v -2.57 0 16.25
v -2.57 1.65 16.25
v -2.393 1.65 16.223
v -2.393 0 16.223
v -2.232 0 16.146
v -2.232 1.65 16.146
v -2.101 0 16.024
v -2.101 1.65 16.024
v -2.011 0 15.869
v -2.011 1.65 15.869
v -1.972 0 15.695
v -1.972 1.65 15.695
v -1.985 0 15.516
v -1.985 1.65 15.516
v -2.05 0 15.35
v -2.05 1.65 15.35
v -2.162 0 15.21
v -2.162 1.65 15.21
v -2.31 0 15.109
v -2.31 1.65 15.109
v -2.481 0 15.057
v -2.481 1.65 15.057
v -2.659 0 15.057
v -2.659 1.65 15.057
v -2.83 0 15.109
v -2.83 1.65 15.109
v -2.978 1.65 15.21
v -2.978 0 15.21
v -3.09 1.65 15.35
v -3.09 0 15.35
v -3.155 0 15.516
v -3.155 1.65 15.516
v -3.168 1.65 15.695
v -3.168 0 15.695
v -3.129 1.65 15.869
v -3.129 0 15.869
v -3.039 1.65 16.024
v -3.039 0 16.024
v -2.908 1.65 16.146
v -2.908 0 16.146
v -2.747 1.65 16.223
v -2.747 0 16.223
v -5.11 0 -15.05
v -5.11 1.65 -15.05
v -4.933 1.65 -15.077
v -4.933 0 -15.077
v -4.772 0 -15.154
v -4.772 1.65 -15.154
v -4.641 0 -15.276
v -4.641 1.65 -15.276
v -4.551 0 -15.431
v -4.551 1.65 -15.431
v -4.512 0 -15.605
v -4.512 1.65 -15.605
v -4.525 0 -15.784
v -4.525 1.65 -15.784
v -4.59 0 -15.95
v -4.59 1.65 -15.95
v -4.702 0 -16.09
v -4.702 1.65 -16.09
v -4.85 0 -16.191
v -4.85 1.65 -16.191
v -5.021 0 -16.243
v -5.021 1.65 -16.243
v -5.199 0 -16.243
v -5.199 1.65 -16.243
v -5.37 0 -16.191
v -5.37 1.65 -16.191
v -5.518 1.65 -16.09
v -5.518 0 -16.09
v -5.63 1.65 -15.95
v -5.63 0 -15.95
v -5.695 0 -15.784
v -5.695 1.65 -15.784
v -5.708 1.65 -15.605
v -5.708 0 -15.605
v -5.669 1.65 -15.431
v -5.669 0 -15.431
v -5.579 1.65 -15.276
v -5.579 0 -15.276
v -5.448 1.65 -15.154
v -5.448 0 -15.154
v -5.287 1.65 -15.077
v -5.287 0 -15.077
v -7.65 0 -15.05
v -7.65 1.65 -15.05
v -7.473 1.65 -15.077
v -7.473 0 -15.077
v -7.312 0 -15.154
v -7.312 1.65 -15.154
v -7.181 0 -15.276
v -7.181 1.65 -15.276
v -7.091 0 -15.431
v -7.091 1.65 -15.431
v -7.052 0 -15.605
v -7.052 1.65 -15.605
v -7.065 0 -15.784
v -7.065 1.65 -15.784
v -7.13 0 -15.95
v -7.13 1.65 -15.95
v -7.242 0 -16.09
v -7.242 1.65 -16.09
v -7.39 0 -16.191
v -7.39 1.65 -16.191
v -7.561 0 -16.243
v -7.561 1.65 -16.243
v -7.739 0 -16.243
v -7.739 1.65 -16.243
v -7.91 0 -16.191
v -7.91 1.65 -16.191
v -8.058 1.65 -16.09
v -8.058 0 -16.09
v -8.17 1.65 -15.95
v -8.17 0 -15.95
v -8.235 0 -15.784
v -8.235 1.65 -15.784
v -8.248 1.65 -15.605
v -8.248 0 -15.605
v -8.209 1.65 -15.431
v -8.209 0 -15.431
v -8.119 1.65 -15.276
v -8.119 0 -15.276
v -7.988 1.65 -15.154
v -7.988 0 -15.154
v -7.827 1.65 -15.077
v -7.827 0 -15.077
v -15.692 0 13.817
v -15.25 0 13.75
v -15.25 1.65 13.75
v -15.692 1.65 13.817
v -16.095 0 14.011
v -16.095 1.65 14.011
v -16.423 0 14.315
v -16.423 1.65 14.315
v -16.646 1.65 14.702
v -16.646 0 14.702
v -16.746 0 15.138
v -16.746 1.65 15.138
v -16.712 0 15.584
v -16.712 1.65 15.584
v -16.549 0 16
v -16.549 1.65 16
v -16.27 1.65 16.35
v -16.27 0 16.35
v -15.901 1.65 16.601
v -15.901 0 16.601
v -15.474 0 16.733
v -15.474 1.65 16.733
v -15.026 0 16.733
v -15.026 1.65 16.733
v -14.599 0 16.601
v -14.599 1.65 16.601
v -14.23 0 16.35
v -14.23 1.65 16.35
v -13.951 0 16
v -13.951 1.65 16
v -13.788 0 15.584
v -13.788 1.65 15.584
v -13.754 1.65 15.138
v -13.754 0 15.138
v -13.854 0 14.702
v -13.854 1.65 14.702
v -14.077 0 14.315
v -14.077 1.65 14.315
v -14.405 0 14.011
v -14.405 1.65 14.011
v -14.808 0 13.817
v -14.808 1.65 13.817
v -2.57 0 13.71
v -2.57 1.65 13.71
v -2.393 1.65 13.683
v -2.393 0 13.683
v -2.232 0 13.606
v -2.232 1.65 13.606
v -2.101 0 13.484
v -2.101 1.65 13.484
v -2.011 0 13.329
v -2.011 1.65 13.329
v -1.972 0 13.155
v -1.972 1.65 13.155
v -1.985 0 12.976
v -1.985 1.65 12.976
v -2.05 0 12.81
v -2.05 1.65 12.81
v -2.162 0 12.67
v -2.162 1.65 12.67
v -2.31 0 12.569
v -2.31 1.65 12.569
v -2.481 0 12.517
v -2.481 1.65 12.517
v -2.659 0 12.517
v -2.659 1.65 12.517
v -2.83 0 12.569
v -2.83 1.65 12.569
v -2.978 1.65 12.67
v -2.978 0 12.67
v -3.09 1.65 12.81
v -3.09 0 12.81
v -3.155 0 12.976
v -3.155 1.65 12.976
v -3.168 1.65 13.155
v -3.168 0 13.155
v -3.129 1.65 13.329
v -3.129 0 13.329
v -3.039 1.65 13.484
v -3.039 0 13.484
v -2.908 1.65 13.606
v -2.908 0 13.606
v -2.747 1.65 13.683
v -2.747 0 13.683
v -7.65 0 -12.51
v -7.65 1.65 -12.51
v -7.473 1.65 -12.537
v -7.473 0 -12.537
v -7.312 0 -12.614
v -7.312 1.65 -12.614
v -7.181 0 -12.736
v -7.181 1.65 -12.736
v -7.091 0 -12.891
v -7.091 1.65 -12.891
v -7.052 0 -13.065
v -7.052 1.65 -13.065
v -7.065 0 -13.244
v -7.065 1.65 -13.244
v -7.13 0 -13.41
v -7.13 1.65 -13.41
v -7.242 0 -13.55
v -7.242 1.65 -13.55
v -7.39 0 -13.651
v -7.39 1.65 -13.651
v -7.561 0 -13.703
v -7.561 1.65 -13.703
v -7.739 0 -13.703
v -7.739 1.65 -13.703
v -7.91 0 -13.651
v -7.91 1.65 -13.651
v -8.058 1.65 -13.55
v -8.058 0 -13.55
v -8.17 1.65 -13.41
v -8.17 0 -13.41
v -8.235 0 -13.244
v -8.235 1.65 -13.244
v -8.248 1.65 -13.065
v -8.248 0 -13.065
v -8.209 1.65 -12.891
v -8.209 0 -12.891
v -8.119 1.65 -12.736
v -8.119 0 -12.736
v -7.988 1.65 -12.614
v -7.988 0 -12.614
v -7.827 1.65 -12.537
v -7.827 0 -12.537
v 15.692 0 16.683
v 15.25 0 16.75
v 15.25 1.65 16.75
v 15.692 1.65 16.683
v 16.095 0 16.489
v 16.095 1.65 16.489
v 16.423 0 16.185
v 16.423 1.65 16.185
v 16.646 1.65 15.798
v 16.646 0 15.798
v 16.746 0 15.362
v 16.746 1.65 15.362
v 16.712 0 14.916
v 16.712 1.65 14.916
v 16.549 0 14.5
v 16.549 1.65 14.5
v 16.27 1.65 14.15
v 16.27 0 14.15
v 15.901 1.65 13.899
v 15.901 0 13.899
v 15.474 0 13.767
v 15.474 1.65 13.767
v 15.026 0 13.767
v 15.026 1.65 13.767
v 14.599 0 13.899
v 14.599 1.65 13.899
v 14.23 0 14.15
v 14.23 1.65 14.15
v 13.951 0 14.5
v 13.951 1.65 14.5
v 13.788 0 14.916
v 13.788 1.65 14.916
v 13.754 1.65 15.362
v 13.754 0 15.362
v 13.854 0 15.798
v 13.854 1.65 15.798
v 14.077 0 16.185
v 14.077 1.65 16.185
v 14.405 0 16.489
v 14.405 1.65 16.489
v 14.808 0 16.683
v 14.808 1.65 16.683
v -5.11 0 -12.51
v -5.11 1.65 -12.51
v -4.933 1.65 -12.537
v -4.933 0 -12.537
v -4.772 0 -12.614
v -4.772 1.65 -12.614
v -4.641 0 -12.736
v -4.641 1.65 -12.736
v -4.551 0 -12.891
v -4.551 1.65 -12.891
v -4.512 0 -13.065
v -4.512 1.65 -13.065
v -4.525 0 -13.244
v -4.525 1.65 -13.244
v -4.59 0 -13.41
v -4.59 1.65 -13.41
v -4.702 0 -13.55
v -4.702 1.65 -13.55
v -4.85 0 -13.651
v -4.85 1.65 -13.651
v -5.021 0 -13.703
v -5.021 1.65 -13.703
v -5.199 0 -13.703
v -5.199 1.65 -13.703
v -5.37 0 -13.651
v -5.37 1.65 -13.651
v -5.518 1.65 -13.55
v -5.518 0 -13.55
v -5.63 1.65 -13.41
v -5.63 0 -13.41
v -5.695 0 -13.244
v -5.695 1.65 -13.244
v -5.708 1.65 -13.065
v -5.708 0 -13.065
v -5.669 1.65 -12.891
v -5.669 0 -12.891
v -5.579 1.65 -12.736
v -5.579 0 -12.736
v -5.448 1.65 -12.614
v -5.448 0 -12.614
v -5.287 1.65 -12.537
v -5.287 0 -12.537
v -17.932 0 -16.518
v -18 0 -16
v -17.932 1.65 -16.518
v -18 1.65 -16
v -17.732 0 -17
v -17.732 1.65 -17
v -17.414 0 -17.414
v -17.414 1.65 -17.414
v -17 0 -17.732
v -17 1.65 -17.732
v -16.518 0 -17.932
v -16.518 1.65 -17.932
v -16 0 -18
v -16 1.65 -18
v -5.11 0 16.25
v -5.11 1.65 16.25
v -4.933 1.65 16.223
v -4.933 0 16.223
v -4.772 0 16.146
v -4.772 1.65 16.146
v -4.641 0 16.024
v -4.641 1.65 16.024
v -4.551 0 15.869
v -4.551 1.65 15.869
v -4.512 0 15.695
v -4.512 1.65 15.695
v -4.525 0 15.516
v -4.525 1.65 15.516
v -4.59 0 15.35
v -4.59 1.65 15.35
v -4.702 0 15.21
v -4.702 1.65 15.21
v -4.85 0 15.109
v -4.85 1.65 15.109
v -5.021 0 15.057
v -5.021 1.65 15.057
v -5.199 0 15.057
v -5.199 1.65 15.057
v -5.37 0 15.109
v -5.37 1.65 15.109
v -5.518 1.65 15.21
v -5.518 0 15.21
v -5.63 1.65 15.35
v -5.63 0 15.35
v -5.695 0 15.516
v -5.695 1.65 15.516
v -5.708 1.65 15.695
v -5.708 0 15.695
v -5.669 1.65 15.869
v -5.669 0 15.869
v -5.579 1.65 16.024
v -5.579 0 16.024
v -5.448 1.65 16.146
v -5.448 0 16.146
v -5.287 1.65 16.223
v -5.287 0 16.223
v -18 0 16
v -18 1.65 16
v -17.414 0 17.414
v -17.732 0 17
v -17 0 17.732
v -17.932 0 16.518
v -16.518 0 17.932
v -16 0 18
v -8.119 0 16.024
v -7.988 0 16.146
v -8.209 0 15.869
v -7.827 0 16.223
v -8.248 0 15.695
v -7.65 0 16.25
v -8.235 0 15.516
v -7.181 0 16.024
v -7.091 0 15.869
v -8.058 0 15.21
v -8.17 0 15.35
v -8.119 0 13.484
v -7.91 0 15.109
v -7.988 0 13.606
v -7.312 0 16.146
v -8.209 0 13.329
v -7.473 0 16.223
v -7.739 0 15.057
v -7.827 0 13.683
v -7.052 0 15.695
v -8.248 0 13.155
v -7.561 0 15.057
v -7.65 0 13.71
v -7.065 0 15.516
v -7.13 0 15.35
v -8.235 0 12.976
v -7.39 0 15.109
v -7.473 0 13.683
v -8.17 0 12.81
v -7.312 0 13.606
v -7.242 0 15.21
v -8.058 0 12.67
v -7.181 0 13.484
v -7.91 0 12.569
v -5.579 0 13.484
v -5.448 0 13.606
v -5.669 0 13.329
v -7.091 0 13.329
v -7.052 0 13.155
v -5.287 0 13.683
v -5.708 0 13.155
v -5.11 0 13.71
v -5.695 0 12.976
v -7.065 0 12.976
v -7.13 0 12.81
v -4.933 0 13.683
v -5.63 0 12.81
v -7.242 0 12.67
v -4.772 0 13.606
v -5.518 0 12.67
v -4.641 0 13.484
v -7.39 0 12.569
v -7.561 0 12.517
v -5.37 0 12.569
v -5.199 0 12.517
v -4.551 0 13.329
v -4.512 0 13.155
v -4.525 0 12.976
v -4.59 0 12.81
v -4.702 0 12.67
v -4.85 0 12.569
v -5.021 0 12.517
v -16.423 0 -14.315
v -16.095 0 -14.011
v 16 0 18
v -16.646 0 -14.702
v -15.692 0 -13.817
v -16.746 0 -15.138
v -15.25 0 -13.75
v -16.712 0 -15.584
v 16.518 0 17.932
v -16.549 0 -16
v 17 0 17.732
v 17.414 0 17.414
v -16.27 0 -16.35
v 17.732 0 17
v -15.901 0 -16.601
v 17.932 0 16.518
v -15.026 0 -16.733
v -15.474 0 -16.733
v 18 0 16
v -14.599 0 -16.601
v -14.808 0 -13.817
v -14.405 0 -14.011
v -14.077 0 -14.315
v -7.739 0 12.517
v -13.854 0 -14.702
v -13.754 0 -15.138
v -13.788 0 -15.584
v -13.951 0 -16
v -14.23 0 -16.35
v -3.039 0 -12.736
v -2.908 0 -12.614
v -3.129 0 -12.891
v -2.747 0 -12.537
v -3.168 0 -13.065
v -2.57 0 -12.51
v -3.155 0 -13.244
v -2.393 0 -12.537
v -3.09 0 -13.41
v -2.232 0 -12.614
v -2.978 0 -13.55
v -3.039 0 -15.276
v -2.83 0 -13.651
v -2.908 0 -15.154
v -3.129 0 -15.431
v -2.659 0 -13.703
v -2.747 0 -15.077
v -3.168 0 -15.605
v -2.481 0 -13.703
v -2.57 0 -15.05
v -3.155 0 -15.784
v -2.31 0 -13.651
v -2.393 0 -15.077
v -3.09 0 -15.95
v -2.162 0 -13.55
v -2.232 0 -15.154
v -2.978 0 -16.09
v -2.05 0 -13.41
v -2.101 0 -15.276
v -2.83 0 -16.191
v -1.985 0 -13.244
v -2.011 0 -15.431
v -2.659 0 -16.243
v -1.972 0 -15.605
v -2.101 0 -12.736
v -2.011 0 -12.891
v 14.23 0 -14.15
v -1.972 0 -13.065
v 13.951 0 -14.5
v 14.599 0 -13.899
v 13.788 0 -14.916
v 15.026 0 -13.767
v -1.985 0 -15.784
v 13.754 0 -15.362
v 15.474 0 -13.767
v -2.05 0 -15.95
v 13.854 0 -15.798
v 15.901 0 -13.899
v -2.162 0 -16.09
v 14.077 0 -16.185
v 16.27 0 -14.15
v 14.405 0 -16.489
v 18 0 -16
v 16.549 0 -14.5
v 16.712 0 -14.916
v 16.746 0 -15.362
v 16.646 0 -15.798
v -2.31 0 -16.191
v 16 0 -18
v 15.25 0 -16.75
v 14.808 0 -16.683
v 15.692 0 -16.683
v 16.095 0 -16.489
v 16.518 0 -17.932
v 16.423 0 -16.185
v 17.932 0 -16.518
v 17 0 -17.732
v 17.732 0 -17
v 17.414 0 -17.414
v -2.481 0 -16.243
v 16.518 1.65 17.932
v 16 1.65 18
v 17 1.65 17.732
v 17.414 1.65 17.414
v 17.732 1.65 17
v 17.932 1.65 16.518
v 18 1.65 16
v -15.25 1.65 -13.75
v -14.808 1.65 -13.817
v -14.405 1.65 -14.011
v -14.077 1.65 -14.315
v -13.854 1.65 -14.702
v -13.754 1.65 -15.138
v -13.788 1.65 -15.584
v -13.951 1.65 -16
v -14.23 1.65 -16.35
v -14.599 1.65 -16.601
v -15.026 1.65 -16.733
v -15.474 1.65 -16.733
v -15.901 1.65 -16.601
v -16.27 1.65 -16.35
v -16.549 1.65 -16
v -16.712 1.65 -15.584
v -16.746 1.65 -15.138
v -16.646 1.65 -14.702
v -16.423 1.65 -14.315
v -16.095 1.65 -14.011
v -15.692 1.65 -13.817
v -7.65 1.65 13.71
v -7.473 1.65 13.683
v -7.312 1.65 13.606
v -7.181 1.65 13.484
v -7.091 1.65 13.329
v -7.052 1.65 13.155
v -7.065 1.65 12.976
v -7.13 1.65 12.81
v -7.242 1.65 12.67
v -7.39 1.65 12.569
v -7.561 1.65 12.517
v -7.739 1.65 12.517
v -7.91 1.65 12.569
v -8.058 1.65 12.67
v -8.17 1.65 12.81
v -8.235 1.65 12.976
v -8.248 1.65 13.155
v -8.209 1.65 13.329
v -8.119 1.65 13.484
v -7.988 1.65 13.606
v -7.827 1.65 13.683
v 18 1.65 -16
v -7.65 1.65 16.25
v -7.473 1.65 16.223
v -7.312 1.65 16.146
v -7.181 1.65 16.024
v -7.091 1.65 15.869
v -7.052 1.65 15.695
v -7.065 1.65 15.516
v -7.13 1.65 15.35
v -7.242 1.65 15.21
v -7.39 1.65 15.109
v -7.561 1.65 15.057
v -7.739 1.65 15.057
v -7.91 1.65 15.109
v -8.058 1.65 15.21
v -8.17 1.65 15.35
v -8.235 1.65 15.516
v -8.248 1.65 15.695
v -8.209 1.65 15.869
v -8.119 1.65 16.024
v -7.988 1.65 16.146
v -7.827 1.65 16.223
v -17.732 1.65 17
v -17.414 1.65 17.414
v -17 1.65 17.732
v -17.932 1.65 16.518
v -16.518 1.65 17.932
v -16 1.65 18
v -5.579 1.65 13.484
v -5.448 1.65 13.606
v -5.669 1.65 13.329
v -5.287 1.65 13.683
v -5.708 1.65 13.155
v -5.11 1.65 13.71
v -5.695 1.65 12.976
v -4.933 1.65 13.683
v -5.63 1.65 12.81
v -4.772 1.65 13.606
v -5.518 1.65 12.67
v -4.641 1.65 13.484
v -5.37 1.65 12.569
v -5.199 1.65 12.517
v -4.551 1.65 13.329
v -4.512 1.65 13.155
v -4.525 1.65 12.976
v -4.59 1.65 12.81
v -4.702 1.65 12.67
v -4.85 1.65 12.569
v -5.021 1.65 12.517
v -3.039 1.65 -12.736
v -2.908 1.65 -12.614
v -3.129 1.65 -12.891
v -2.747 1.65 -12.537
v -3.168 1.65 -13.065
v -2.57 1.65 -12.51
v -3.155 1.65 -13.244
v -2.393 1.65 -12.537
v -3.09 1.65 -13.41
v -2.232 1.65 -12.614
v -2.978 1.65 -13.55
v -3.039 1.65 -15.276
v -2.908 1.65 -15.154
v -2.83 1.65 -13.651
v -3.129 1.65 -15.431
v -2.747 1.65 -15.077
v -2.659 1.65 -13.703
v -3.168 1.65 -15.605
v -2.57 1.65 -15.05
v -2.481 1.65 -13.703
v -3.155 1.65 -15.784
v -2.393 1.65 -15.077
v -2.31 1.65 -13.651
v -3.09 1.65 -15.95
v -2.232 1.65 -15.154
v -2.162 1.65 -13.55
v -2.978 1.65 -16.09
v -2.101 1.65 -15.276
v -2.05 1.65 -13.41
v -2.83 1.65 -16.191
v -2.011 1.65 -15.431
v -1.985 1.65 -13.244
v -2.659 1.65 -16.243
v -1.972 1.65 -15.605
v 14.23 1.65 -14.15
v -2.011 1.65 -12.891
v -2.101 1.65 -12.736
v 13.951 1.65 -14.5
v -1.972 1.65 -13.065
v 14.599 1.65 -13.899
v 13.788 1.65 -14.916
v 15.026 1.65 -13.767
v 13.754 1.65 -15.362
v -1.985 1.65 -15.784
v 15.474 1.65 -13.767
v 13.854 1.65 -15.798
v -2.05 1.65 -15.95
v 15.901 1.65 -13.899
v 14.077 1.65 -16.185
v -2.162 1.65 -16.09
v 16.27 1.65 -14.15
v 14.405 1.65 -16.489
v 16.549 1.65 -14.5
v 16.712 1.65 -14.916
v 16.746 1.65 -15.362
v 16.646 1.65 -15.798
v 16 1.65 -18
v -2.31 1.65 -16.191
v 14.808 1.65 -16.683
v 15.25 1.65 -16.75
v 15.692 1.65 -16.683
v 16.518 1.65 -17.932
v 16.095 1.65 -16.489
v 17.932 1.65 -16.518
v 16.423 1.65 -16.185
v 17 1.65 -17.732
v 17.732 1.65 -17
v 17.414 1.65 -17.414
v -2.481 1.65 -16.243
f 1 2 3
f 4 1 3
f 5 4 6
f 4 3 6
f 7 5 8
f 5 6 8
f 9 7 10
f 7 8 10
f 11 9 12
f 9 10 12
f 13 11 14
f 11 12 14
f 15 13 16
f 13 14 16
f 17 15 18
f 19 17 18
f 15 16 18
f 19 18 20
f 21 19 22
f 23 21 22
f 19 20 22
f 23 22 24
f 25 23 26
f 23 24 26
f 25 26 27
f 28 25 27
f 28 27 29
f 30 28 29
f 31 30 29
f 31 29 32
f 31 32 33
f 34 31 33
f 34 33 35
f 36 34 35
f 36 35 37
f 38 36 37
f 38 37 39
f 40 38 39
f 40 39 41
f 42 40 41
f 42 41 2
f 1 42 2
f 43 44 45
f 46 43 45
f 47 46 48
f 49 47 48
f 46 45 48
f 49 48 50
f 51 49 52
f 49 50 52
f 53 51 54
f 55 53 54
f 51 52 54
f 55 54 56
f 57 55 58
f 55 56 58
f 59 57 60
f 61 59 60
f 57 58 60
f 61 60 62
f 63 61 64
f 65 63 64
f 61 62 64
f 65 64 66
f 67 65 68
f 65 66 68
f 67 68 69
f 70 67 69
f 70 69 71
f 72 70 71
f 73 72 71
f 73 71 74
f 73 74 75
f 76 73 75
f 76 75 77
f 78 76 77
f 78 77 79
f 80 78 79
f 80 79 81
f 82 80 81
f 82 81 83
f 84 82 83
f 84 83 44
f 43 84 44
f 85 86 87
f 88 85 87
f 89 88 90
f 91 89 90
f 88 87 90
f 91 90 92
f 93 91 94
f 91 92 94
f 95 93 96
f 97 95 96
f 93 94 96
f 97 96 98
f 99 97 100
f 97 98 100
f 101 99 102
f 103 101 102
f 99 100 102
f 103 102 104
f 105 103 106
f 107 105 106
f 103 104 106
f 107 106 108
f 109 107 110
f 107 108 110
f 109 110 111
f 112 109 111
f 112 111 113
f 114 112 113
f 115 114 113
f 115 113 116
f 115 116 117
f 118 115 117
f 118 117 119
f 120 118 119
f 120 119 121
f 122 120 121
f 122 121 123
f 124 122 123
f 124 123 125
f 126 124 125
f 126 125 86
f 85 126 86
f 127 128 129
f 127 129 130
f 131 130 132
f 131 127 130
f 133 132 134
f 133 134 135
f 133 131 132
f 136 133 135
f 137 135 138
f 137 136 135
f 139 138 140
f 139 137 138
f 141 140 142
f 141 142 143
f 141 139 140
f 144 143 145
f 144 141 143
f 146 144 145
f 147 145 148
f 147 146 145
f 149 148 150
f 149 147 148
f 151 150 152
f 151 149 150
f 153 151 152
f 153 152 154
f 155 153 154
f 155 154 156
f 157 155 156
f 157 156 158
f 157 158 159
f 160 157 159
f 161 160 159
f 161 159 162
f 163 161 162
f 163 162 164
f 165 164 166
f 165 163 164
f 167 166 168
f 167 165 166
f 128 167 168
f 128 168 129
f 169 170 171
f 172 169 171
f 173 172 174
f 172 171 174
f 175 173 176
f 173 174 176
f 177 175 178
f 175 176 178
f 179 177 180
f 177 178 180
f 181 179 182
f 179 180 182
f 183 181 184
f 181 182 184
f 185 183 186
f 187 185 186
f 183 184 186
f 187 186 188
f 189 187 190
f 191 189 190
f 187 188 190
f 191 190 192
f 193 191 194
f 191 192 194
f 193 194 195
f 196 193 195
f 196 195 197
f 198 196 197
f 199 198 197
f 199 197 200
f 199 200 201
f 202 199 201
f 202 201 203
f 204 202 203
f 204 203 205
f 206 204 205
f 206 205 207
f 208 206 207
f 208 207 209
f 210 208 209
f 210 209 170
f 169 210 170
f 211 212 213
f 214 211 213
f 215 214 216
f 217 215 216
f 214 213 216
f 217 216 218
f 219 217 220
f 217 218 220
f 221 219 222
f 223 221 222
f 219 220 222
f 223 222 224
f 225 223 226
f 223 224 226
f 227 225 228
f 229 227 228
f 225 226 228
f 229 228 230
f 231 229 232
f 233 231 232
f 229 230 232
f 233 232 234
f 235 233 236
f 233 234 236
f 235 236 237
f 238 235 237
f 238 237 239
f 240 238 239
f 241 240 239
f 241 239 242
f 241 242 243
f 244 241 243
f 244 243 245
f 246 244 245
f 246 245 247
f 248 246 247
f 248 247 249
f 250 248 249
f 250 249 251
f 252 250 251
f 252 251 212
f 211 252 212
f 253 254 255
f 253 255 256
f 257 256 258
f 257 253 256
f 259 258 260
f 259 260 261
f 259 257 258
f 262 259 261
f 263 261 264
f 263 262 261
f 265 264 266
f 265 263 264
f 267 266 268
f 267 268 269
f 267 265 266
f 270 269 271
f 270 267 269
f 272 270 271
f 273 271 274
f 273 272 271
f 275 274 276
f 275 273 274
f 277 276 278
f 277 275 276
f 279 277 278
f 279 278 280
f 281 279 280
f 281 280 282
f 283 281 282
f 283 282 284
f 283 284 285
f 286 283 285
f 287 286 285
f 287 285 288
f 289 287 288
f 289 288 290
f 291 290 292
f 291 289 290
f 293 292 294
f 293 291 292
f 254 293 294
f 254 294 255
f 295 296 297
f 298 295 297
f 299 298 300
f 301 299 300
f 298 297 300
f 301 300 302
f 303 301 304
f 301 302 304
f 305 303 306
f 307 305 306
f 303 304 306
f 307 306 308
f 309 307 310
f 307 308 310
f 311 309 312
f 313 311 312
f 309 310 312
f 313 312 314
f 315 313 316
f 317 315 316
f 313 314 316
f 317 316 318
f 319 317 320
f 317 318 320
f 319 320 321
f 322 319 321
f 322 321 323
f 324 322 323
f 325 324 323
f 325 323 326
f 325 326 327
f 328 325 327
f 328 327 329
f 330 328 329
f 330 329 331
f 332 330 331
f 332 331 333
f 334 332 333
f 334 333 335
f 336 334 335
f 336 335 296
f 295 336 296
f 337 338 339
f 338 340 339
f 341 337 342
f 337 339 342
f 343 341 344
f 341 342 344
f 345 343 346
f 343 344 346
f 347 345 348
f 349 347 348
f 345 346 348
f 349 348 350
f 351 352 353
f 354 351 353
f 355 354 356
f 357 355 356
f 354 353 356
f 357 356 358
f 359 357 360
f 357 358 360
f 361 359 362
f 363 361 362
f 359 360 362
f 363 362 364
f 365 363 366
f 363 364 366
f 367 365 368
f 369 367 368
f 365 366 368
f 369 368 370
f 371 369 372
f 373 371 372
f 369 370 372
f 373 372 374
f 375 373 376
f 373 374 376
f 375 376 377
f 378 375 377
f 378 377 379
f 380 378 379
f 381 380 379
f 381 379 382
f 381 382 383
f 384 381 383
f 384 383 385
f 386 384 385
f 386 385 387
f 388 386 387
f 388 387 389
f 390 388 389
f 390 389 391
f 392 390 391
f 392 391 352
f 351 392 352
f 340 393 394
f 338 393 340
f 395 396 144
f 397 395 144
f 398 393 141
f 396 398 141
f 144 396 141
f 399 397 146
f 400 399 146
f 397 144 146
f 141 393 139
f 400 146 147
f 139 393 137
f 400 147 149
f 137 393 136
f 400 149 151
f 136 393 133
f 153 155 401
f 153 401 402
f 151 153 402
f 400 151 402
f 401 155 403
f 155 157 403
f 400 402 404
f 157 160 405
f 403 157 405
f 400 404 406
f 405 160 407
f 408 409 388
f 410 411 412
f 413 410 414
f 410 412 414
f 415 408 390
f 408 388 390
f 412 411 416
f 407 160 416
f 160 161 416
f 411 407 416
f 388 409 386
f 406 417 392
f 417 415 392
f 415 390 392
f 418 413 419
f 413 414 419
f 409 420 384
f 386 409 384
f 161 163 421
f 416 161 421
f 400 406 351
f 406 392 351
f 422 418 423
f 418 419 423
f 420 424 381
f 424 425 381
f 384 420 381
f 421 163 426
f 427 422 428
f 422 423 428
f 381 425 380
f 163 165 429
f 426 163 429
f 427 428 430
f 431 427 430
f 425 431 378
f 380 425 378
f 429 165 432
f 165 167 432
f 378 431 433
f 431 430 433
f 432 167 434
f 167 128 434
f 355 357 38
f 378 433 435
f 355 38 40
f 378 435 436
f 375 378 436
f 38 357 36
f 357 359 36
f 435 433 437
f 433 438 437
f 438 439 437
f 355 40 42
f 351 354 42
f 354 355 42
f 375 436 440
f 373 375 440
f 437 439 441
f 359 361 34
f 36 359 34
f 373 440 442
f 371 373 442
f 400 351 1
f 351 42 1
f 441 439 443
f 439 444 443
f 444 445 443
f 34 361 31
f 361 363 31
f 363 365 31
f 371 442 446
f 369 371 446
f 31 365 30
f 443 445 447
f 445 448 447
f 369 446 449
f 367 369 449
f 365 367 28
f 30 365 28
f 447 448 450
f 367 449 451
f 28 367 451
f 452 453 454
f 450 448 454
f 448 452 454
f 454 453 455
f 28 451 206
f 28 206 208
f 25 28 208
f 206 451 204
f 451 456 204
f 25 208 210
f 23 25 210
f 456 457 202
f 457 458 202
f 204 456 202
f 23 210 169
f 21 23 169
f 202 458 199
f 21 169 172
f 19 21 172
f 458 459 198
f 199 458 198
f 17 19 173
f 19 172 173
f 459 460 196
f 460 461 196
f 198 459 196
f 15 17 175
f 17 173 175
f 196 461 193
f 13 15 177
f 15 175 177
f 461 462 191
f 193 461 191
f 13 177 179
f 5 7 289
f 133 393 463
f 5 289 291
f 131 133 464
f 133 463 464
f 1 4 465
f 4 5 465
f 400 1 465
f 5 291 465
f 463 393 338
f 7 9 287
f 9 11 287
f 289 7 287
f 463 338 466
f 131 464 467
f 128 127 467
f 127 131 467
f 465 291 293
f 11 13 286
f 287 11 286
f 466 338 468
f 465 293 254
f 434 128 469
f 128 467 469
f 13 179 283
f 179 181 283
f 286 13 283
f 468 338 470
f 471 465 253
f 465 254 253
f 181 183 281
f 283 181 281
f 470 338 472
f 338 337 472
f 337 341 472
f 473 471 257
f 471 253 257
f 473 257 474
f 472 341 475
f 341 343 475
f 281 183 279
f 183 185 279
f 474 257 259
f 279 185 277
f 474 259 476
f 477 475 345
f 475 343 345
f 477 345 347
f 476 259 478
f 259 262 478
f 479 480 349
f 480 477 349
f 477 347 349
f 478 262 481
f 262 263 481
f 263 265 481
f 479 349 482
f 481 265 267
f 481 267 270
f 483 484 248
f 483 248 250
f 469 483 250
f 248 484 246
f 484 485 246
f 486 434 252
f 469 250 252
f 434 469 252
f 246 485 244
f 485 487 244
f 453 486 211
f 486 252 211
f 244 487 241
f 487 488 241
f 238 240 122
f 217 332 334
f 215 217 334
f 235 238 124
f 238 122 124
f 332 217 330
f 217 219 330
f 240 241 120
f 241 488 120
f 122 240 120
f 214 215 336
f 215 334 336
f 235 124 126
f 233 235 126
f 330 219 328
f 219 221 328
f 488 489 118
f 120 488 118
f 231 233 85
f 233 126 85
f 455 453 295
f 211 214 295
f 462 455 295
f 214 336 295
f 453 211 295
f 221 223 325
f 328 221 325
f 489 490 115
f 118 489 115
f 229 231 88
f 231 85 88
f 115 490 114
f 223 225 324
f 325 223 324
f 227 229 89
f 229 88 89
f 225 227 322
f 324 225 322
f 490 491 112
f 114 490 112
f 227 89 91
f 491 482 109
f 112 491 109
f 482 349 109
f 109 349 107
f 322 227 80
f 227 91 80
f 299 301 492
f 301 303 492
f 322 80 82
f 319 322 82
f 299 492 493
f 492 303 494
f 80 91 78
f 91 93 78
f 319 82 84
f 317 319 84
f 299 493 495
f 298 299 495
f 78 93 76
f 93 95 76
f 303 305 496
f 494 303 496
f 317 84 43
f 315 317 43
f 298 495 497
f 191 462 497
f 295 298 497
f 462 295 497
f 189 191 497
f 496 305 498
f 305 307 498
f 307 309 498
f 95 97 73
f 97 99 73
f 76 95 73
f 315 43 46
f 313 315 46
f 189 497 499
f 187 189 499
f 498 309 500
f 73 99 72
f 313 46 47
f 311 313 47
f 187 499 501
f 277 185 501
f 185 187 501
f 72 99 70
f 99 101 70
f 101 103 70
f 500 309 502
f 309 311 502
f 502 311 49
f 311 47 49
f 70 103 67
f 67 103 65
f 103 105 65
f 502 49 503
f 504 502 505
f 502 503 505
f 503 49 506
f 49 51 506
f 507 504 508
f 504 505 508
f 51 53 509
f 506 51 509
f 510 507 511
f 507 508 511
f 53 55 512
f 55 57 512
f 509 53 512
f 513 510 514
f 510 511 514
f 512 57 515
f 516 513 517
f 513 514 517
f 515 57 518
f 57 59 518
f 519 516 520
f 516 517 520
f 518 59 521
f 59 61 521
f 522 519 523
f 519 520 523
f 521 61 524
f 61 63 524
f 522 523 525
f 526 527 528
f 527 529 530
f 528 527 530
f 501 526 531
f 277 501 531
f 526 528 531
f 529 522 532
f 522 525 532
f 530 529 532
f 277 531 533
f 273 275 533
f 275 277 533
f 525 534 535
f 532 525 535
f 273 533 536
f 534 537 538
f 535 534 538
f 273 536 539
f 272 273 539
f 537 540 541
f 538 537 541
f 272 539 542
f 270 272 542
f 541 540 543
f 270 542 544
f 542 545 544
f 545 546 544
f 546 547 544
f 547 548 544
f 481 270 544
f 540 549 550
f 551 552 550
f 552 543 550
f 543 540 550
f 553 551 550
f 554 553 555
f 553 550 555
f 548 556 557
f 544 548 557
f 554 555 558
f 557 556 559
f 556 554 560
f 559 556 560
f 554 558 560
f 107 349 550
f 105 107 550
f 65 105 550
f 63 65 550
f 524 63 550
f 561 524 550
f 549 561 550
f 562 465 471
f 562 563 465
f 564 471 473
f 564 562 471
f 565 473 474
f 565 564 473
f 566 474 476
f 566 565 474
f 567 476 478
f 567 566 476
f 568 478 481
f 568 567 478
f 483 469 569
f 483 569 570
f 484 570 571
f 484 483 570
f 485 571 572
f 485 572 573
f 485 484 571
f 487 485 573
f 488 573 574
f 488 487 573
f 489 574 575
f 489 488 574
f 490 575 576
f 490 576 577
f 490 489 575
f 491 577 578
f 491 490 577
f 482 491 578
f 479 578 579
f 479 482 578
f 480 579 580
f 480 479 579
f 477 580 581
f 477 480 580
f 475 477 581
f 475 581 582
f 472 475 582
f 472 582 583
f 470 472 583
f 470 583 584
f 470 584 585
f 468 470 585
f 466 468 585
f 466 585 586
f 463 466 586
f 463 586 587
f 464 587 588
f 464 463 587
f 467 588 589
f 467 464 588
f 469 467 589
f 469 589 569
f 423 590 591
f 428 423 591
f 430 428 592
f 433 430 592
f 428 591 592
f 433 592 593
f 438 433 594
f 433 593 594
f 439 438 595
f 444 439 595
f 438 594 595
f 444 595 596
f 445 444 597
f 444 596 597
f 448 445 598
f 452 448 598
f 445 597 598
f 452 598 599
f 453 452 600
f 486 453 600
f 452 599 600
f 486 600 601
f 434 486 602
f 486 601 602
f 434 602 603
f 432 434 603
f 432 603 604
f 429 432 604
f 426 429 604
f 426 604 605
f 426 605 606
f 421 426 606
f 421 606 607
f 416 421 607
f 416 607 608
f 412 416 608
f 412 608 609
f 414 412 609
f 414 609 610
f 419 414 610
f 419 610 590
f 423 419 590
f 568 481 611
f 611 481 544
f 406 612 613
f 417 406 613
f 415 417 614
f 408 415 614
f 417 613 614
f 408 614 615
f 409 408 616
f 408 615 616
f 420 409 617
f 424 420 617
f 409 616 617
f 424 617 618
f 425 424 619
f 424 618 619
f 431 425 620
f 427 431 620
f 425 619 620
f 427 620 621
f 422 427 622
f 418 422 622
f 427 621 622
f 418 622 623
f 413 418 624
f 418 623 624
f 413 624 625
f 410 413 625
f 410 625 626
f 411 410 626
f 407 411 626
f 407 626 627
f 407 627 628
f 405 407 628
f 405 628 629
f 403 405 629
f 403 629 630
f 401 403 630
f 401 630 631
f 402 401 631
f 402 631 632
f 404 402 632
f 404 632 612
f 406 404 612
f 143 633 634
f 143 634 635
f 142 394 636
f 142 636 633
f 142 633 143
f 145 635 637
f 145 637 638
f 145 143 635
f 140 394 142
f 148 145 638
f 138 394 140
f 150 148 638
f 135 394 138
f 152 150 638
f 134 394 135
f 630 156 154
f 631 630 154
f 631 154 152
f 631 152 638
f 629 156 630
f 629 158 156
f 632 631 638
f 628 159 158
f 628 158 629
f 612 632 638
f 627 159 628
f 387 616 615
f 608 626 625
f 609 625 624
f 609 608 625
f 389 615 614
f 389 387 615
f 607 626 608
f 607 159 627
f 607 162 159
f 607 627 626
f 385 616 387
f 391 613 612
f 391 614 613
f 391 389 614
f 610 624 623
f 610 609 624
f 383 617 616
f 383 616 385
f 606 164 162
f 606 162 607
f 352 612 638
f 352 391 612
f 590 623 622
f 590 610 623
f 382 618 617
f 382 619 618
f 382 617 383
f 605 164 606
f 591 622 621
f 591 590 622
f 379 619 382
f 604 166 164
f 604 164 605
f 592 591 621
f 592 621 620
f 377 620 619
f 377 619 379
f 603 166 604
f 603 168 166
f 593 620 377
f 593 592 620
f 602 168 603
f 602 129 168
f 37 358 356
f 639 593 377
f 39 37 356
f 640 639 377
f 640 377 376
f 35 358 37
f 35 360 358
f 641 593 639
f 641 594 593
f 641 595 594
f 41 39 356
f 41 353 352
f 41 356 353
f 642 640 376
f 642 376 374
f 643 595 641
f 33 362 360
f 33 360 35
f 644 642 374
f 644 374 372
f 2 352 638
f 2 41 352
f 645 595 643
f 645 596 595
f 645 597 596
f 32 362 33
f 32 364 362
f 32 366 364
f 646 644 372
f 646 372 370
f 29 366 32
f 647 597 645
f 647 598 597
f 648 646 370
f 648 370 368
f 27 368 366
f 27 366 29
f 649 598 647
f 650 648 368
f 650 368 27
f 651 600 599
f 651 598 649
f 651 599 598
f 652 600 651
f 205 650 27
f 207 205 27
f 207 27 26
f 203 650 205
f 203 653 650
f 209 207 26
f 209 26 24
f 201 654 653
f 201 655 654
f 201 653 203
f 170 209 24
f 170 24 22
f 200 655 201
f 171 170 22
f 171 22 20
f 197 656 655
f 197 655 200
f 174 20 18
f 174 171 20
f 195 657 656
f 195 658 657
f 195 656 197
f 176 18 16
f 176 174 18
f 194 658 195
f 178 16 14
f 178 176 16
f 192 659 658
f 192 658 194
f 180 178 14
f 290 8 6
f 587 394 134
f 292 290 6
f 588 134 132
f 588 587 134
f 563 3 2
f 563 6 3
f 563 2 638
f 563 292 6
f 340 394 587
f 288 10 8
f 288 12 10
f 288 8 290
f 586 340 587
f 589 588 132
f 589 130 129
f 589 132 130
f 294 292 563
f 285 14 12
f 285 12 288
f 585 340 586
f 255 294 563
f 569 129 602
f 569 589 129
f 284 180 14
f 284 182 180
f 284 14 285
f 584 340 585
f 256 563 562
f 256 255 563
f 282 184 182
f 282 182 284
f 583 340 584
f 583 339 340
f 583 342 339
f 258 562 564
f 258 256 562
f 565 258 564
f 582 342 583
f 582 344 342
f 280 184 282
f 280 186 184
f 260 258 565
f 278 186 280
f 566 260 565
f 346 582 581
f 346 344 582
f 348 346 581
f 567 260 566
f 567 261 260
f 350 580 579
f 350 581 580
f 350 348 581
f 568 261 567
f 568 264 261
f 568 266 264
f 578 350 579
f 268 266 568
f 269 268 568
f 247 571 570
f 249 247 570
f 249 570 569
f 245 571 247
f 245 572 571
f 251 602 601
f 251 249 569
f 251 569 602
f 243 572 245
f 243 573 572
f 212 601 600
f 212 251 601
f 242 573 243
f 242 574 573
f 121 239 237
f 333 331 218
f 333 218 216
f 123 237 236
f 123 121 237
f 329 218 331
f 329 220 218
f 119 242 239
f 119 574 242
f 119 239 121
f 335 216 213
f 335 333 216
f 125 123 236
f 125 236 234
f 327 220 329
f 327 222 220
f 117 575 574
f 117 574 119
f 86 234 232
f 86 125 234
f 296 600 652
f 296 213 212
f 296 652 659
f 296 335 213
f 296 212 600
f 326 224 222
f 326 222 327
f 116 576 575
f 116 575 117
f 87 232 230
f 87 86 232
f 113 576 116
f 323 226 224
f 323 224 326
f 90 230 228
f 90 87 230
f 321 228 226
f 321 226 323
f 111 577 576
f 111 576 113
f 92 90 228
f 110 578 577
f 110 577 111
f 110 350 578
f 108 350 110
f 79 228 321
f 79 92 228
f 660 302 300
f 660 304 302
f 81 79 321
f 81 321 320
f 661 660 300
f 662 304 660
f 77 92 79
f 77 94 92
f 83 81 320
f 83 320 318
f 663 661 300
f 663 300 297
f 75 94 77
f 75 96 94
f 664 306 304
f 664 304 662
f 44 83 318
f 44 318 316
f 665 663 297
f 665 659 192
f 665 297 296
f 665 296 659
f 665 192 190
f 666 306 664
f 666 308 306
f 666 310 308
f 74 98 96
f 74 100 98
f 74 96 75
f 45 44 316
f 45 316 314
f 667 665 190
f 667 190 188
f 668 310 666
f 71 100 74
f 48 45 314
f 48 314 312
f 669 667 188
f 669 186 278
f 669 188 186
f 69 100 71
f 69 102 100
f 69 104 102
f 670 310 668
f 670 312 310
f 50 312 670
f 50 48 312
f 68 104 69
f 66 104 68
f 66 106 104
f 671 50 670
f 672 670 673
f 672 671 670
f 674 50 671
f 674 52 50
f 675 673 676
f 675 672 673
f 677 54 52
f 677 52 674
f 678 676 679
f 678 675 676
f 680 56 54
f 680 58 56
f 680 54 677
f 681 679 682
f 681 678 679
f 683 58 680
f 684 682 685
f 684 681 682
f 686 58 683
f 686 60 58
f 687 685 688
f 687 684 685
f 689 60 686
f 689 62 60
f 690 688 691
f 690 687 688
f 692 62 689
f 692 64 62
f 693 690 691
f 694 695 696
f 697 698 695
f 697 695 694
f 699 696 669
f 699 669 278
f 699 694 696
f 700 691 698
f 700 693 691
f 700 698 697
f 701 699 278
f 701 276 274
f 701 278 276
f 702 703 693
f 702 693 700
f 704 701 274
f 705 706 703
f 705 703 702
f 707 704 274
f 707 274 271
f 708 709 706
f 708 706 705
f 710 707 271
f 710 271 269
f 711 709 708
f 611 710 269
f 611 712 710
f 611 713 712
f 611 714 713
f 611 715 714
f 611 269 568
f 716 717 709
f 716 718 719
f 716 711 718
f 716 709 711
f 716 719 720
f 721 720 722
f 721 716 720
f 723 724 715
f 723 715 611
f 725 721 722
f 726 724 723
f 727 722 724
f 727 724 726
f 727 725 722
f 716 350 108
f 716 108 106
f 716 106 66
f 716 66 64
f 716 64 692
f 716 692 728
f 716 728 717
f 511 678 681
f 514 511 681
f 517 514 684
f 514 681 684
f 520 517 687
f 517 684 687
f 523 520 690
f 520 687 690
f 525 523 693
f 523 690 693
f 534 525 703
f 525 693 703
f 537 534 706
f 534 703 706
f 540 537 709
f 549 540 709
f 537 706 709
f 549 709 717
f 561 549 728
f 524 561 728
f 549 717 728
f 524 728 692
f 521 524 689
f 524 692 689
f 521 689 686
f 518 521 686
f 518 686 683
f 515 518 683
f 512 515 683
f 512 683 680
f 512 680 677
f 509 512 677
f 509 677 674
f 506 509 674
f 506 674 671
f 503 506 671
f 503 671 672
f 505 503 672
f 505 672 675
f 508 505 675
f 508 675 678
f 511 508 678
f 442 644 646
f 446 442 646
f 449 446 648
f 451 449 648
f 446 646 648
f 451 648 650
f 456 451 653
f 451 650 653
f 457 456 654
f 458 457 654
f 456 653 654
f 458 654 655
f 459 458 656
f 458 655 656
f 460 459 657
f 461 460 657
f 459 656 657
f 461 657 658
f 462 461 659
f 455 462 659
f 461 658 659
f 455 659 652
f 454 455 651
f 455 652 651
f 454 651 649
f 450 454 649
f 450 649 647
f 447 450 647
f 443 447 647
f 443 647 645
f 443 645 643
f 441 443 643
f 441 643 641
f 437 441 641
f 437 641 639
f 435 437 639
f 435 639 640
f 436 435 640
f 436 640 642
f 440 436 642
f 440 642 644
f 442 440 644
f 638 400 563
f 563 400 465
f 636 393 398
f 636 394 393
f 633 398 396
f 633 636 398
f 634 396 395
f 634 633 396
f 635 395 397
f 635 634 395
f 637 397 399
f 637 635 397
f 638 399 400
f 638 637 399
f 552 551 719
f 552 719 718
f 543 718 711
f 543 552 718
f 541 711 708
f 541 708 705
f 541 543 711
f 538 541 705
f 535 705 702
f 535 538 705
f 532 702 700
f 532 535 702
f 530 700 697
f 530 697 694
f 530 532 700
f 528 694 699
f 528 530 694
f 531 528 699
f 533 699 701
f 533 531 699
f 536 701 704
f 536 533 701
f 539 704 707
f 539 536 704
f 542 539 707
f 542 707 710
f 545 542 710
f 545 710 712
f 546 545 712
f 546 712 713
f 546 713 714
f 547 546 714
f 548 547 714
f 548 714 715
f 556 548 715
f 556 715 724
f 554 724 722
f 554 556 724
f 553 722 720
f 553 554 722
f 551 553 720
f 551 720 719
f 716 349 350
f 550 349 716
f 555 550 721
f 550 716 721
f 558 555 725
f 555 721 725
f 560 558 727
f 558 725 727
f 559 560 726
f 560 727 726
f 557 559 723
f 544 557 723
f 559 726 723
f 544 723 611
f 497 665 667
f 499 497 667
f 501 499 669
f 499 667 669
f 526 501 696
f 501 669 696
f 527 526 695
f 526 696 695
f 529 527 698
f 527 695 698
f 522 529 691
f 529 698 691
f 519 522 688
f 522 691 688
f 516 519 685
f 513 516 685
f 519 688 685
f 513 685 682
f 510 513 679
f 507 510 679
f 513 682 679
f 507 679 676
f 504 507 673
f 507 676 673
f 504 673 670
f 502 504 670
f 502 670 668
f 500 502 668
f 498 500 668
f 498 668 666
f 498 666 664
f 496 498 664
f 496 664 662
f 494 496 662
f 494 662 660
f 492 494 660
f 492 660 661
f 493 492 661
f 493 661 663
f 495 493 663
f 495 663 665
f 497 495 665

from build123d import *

# Parameters (mm, degrees)
SKETCH1_W             = 36
SKETCH1_H             = 36
SKETCH1_R             = 1.5
BASE_SHAPE_DEPTH      = 1.65
ROUNDED_CORNERS_R     = 2
PINHEADER_HOLES_REACH = 27.509
SKETCH2_R             = 0.6


with BuildPart() as part:
    # Sketch1 → Base shape (new body)
    with BuildSketch(Plane(origin=(0, 0, 0), x_dir=(1, 0, 0), z_dir=(0, 1, 0))):
        Rectangle(SKETCH1_W, SKETCH1_H)
        with Locations(Location((-15.25, 15.25, 0), (0, 0, 270))):
            Circle(SKETCH1_R, mode=Mode.SUBTRACT)
        with Locations(Location((15.25, 15.25, 0), (0, 0, 90))):
            Circle(SKETCH1_R, mode=Mode.SUBTRACT)
        with Locations(Location((15.25, -15.25, 0), (0, 0, 270))):
            Circle(SKETCH1_R, mode=Mode.SUBTRACT)
        with Locations(Location((-15.25, -15.25, 0), (0, 0, 90))):
            Circle(SKETCH1_R, mode=Mode.SUBTRACT)
    extrude(amount=BASE_SHAPE_DEPTH)

    # Rounded corners
    rounded_corners_edges = [part.edges().sort_by_distance(p)[0] for p in [
        (18, 0.825, 18),
        (-18, 0.825, 18),
        (-18, 0.825, -18),
        (18, 0.825, -18),
    ]]
    fillet(rounded_corners_edges, radius=ROUNDED_CORNERS_R)

    # Sketch2 → Pinheader holes (cut, up to next)
    with BuildSketch(Plane(origin=(0, 1.65, 0), x_dir=(1, 0, 0), z_dir=(0, 1, 0)), mode=Mode.PRIVATE) as pinheader_holes_sk1:
        with Locations(Location((-5.11, 15.65, 0), (0, 0, 270))):
            Circle(SKETCH2_R)
    pinheader_holes_tool1 = extrude(pinheader_holes_sk1.sketch, amount=-PINHEADER_HOLES_REACH, mode=Mode.PRIVATE) & part.part
    # Sketch2 → Pinheader holes (cut, up to next)
    with BuildSketch(Plane(origin=(0, 1.65, 0), x_dir=(1, 0, 0), z_dir=(0, 1, 0)), mode=Mode.PRIVATE) as pinheader_holes_sk2:
        with Locations(Location((-7.65, 15.65, 0), (0, 0, 270))):
            Circle(SKETCH2_R)
    pinheader_holes_tool2 = extrude(pinheader_holes_sk2.sketch, amount=-PINHEADER_HOLES_REACH, mode=Mode.PRIVATE) & part.part
    # Sketch2 → Pinheader holes (cut, up to next)
    with BuildSketch(Plane(origin=(0, 1.65, 0), x_dir=(1, 0, 0), z_dir=(0, 1, 0)), mode=Mode.PRIVATE) as pinheader_holes_sk3:
        with Locations(Location((-2.57, 15.65, 0), (0, 0, 270))):
            Circle(SKETCH2_R)
    pinheader_holes_tool3 = extrude(pinheader_holes_sk3.sketch, amount=-PINHEADER_HOLES_REACH, mode=Mode.PRIVATE) & part.part
    # Sketch2 → Pinheader holes (cut, up to next)
    with BuildSketch(Plane(origin=(0, 1.65, 0), x_dir=(1, 0, 0), z_dir=(0, 1, 0)), mode=Mode.PRIVATE) as pinheader_holes_sk4:
        with Locations(Location((-5.11, 13.11, 0), (0, 0, 270))):
            Circle(SKETCH2_R)
    pinheader_holes_tool4 = extrude(pinheader_holes_sk4.sketch, amount=-PINHEADER_HOLES_REACH, mode=Mode.PRIVATE) & part.part
    # Sketch2 → Pinheader holes (cut, up to next)
    with BuildSketch(Plane(origin=(0, 1.65, 0), x_dir=(1, 0, 0), z_dir=(0, 1, 0)), mode=Mode.PRIVATE) as pinheader_holes_sk5:
        with Locations(Location((-2.57, 13.11, 0), (0, 0, 270))):
            Circle(SKETCH2_R)
    pinheader_holes_tool5 = extrude(pinheader_holes_sk5.sketch, amount=-PINHEADER_HOLES_REACH, mode=Mode.PRIVATE) & part.part
    # Sketch2 → Pinheader holes (cut, up to next)
    with BuildSketch(Plane(origin=(0, 1.65, 0), x_dir=(1, 0, 0), z_dir=(0, 1, 0)), mode=Mode.PRIVATE) as pinheader_holes_sk6:
        with Locations(Location((-7.65, 13.11, 0), (0, 0, 270))):
            Circle(SKETCH2_R)
    pinheader_holes_tool6 = extrude(pinheader_holes_sk6.sketch, amount=-PINHEADER_HOLES_REACH, mode=Mode.PRIVATE) & part.part
    # Sketch2 → Pinheader holes (cut, up to next)
    with BuildSketch(Plane(origin=(0, 1.65, 0), x_dir=(1, 0, 0), z_dir=(0, 1, 0)), mode=Mode.PRIVATE) as pinheader_holes_sk7:
        with Locations(Location((-2.57, -13.11, 0), (0, 0, 270))):
            Circle(SKETCH2_R)
    pinheader_holes_tool7 = extrude(pinheader_holes_sk7.sketch, amount=-PINHEADER_HOLES_REACH, mode=Mode.PRIVATE) & part.part
    # Sketch2 → Pinheader holes (cut, up to next)
    with BuildSketch(Plane(origin=(0, 1.65, 0), x_dir=(1, 0, 0), z_dir=(0, 1, 0)), mode=Mode.PRIVATE) as pinheader_holes_sk8:
        with Locations(Location((-2.57, -15.65, 0), (0, 0, 270))):
            Circle(SKETCH2_R)
    pinheader_holes_tool8 = extrude(pinheader_holes_sk8.sketch, amount=-PINHEADER_HOLES_REACH, mode=Mode.PRIVATE) & part.part
    # Sketch2 → Pinheader holes (cut, up to next)
    with BuildSketch(Plane(origin=(0, 1.65, 0), x_dir=(1, 0, 0), z_dir=(0, 1, 0)), mode=Mode.PRIVATE) as pinheader_holes_sk9:
        with Locations(Location((-5.11, -13.11, 0), (0, 0, 270))):
            Circle(SKETCH2_R)
    pinheader_holes_tool9 = extrude(pinheader_holes_sk9.sketch, amount=-PINHEADER_HOLES_REACH, mode=Mode.PRIVATE) & part.part
    # Sketch2 → Pinheader holes (cut, up to next)
    with BuildSketch(Plane(origin=(0, 1.65, 0), x_dir=(1, 0, 0), z_dir=(0, 1, 0)), mode=Mode.PRIVATE) as pinheader_holes_sk10:
        with Locations(Location((-5.11, -15.65, 0), (0, 0, 270))):
            Circle(SKETCH2_R)
    pinheader_holes_tool10 = extrude(pinheader_holes_sk10.sketch, amount=-PINHEADER_HOLES_REACH, mode=Mode.PRIVATE) & part.part
    # Sketch2 → Pinheader holes (cut, up to next)
    with BuildSketch(Plane(origin=(0, 1.65, 0), x_dir=(1, 0, 0), z_dir=(0, 1, 0)), mode=Mode.PRIVATE) as pinheader_holes_sk11:
        with Locations(Location((-7.65, -13.11, 0), (0, 0, 270))):
            Circle(SKETCH2_R)
    pinheader_holes_tool11 = extrude(pinheader_holes_sk11.sketch, amount=-PINHEADER_HOLES_REACH, mode=Mode.PRIVATE) & part.part
    # Sketch2 → Pinheader holes (cut, up to next)
    with BuildSketch(Plane(origin=(0, 1.65, 0), x_dir=(1, 0, 0), z_dir=(0, 1, 0)), mode=Mode.PRIVATE) as pinheader_holes_sk12:
        with Locations(Location((-7.65, -15.65, 0), (0, 0, 270))):
            Circle(SKETCH2_R)
    pinheader_holes_tool12 = extrude(pinheader_holes_sk12.sketch, amount=-PINHEADER_HOLES_REACH, mode=Mode.PRIVATE) & part.part
    add(pinheader_holes_tool1.solids().sort_by_distance((-5.11, 1.65, -15.65))[0], mode=Mode.SUBTRACT)
    add(pinheader_holes_tool2.solids().sort_by_distance((-7.65, 1.65, -15.65))[0], mode=Mode.SUBTRACT)
    add(pinheader_holes_tool3.solids().sort_by_distance((-2.57, 1.65, -15.65))[0], mode=Mode.SUBTRACT)
    add(pinheader_holes_tool4.solids().sort_by_distance((-5.11, 1.65, -13.11))[0], mode=Mode.SUBTRACT)
    add(pinheader_holes_tool5.solids().sort_by_distance((-2.57, 1.65, -13.11))[0], mode=Mode.SUBTRACT)
    add(pinheader_holes_tool6.solids().sort_by_distance((-7.65, 1.65, -13.11))[0], mode=Mode.SUBTRACT)
    add(pinheader_holes_tool7.solids().sort_by_distance((-2.57, 1.65, 13.11))[0], mode=Mode.SUBTRACT)
    add(pinheader_holes_tool8.solids().sort_by_distance((-2.57, 1.65, 15.65))[0], mode=Mode.SUBTRACT)
    add(pinheader_holes_tool9.solids().sort_by_distance((-5.11, 1.65, 13.11))[0], mode=Mode.SUBTRACT)
    add(pinheader_holes_tool10.solids().sort_by_distance((-5.11, 1.65, 15.65))[0], mode=Mode.SUBTRACT)
    add(pinheader_holes_tool11.solids().sort_by_distance((-7.65, 1.65, 13.11))[0], mode=Mode.SUBTRACT)
    add(pinheader_holes_tool12.solids().sort_by_distance((-7.65, 1.65, 15.65))[0], mode=Mode.SUBTRACT)


solid = part.part
